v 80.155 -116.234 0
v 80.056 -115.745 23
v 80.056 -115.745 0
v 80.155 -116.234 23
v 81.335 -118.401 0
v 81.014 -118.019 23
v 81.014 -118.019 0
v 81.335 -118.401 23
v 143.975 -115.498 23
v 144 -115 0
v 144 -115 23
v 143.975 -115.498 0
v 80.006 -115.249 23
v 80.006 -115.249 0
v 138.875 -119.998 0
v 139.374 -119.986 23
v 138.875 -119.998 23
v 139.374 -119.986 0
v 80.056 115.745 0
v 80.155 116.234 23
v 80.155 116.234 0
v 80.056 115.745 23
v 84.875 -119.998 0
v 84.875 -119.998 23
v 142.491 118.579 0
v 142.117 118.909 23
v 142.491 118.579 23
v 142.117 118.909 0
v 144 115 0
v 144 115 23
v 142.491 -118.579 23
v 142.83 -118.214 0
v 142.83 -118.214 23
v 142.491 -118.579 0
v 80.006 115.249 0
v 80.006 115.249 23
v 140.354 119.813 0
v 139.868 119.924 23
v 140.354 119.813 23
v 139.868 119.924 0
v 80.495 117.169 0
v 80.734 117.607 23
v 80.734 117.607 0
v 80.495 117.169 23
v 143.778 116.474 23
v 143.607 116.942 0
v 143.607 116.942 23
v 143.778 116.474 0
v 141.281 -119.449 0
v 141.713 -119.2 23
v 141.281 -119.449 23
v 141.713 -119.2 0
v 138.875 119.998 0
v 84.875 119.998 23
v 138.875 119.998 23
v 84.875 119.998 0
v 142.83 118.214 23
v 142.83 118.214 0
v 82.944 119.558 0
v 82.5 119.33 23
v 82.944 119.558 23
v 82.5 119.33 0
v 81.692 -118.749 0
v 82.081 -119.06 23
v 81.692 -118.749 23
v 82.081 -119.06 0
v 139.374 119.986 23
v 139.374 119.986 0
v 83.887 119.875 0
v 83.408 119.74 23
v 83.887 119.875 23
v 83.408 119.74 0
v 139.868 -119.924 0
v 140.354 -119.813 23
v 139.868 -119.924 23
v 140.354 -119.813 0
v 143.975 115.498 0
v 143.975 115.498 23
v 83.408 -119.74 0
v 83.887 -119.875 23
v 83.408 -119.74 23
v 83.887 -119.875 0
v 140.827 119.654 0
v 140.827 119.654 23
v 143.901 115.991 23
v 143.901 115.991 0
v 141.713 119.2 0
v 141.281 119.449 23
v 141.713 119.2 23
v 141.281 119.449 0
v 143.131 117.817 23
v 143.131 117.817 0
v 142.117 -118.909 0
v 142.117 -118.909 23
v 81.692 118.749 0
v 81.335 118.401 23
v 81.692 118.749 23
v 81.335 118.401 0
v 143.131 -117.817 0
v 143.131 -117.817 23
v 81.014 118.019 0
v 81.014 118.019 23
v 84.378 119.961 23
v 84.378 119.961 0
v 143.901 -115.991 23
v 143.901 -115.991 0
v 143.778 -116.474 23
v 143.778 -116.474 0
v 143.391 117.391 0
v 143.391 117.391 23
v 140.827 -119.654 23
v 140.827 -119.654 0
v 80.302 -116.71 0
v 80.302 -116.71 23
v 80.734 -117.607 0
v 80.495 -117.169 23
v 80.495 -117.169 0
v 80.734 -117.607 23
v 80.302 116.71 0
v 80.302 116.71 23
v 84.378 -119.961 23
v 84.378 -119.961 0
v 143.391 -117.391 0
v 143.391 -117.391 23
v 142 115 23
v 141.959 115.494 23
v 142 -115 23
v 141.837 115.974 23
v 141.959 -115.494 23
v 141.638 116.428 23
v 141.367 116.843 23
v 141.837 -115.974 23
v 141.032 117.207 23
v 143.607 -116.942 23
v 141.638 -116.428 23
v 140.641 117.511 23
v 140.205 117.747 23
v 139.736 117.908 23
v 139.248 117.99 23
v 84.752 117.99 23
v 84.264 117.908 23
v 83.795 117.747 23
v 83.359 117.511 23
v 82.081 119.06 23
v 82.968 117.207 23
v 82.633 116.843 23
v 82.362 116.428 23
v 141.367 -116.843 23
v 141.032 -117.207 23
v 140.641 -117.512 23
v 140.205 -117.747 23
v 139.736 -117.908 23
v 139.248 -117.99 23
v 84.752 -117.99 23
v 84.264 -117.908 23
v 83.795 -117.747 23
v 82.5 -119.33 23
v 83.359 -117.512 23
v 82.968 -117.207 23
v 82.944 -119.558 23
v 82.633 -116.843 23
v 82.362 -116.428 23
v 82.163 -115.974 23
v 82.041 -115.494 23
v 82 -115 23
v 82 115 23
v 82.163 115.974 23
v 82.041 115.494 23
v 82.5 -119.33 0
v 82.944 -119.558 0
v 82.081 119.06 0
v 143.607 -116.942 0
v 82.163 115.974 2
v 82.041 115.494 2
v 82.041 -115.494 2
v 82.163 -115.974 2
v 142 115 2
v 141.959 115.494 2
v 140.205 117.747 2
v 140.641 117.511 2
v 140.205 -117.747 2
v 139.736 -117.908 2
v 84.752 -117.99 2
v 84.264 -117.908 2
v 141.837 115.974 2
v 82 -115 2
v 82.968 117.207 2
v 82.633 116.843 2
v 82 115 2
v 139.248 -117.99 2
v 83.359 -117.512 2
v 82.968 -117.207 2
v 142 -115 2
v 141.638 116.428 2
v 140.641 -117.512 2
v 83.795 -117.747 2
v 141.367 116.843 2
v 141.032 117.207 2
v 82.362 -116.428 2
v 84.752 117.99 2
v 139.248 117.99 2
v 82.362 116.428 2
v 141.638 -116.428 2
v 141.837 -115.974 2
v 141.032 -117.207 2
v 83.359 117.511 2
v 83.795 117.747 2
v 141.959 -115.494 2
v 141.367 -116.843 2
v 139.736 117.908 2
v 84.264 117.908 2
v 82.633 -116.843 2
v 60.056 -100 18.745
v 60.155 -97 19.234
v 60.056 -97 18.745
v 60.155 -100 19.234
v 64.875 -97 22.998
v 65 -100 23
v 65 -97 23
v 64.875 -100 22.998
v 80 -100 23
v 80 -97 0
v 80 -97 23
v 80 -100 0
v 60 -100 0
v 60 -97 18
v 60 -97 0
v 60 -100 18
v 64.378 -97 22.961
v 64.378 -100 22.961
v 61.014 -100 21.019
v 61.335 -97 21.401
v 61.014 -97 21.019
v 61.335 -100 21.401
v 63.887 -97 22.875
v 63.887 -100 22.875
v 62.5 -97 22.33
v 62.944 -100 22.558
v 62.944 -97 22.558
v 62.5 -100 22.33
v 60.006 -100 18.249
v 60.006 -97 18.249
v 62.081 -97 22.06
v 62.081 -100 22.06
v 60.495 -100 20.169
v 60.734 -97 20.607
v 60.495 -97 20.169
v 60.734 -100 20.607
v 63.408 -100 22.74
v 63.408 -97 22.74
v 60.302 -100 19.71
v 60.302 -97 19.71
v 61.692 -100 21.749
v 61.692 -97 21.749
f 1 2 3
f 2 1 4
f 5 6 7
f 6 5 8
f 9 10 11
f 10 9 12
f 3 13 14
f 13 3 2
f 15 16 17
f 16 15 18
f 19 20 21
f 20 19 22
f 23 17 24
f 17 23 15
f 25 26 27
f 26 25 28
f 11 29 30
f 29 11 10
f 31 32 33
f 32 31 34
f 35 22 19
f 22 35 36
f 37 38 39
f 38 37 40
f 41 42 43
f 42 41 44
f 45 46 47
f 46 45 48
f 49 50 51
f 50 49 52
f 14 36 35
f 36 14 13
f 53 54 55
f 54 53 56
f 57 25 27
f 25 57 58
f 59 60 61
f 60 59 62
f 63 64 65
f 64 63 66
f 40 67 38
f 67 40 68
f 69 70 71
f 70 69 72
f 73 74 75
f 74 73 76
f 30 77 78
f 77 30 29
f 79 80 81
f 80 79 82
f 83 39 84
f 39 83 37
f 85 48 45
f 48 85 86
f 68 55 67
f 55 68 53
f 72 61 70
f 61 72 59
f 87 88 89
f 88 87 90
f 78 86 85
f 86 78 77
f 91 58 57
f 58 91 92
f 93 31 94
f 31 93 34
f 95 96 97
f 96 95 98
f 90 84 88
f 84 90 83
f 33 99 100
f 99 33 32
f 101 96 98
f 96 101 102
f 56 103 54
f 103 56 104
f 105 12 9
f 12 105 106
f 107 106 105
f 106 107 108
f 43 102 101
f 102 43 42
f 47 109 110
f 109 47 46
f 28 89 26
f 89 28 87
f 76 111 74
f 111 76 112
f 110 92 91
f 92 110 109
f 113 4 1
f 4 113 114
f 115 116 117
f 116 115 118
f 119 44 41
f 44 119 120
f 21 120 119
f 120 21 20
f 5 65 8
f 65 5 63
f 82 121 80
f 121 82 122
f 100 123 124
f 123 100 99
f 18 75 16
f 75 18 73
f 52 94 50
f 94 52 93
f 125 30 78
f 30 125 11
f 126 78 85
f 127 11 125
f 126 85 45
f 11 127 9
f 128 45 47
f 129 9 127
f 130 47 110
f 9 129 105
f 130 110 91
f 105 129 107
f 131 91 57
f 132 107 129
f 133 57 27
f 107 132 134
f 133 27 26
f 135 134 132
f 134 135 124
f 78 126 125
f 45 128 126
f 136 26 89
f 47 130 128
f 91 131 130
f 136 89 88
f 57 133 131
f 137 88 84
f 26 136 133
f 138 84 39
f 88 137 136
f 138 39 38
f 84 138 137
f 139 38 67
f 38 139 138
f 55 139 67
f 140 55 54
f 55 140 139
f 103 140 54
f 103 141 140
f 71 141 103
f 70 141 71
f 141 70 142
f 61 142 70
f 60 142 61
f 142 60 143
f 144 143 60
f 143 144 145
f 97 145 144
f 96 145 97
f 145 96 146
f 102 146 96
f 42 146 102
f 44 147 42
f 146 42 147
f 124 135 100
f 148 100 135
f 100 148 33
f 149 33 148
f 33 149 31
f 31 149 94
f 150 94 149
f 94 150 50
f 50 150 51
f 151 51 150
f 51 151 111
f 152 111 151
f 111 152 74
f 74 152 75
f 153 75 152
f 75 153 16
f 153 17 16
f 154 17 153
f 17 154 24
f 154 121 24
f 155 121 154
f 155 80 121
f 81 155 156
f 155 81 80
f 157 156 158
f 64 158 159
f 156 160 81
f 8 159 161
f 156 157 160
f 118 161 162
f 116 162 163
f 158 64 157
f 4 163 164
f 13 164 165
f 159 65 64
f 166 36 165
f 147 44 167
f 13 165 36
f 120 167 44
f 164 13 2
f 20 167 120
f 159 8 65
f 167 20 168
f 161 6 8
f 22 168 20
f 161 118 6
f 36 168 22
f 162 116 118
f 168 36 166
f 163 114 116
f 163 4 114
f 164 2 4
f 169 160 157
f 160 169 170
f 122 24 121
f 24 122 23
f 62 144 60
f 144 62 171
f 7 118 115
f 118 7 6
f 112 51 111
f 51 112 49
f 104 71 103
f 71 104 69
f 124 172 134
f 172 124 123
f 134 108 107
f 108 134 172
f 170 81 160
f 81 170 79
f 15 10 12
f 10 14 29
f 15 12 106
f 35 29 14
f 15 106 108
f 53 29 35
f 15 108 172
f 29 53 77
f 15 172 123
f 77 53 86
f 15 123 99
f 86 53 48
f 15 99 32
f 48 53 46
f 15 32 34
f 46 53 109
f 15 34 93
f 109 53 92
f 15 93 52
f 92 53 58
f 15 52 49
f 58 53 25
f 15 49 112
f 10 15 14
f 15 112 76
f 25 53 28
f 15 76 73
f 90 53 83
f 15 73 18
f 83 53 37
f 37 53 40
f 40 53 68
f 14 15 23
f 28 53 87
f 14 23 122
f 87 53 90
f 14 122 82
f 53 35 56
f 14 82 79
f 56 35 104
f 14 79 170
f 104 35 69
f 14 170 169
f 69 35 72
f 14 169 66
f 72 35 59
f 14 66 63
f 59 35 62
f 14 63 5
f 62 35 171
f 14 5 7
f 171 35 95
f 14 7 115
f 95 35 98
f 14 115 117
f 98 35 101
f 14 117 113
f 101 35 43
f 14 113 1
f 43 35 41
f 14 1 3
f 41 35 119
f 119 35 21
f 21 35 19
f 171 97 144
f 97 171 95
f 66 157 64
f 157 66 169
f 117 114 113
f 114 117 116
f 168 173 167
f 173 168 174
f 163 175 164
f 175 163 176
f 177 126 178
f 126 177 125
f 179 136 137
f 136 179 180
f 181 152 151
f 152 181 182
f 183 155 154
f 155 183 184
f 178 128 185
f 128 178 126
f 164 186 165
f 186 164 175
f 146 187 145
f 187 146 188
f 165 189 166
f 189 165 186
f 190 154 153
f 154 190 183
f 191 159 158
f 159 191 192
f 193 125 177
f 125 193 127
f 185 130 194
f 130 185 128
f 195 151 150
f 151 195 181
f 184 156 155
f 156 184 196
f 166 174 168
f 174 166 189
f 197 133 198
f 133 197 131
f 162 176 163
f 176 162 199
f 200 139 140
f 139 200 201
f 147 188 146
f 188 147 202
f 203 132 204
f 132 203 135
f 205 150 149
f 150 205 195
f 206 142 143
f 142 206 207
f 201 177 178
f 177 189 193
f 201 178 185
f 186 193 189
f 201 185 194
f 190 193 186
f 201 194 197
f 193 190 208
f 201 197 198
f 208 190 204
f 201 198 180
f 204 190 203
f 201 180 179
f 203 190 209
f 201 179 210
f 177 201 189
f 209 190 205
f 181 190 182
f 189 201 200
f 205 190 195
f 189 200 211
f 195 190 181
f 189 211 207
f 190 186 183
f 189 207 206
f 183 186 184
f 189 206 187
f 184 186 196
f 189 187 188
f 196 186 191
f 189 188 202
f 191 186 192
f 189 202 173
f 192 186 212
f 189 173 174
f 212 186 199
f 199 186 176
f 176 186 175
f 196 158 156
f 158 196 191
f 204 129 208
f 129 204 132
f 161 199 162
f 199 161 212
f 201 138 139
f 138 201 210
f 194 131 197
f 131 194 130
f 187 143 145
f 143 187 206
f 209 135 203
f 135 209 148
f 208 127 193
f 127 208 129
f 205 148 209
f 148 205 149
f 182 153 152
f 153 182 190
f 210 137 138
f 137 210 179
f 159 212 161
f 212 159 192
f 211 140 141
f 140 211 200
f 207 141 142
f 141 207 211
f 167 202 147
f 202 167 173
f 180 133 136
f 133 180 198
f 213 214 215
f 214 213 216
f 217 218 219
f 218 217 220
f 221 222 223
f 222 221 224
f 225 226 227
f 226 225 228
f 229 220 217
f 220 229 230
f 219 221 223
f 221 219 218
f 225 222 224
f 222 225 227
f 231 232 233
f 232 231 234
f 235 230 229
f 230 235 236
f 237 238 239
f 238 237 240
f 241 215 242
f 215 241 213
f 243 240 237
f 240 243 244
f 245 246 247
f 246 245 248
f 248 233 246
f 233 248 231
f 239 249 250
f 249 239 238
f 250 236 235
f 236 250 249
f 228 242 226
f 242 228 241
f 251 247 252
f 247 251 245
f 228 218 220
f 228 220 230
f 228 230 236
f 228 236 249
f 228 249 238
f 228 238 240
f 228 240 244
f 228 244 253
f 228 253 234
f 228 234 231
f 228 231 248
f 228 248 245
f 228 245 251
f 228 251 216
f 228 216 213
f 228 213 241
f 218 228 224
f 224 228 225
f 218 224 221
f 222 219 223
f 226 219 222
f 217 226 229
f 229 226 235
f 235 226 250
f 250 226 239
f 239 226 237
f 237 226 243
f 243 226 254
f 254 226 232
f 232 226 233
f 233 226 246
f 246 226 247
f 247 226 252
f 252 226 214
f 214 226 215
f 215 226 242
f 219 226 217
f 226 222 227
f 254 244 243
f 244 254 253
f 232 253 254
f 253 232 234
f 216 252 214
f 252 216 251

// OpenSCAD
$fa = 5;
$fs = 0.5;

nozzle_to_toolhead_clearance_z = 1.5;

nozzle_max_start_height = 0;

servo = [23, 12.6, 30];
servo_mounts = [
    [-2.5, 6.3, 16],
    [25.5, 6.3, 16]
];
servo_pivot_point = [6.3, 6.3];

reach = 15;

plate_width = 10;

extrusion_to_bed = 60;

height_above_strip = nozzle_to_toolhead_clearance_z + nozzle_max_start_height - 0.5;

bed_height = 38;

strip = [reach + 7, 10, 1.5];
lip = [10, 10, height_above_strip, 1.5];

block = [extrusion_to_bed + 20, strip.y + 10, bed_height + height_above_strip];

servo_pos = [20 + extrusion_to_bed - 26 - servo.y/2 - 2, 2, bed_height - servo.z - strip.z - 1 - 2];

jst_connector = [10.4, 7.5, 6];

bucket_size = [64, 240, 23];
bucket_wall = 2;

base();

translate([20 + extrusion_to_bed - 27, 1, bed_height - strip.z - 1])
tray();

translate([servo_pos.x + servo.y/2, servo_pos.y + servo.y/2, servo_pos.z + servo.z])
pivot_arm();

!translate([extrusion_to_bed + 20, -bucket_size.y + 120, 0])
bucket();

// %translate(servo_pos)
// servo();


module bucket(){
    union() {
        difference() {
            roundedCube(bucket_size, 5);

            translate([bucket_wall, bucket_wall, bucket_wall])
            roundedCube([bucket_size.x - bucket_wall * 2, bucket_size.y - bucket_wall * 2, bucket_size.z], 5 - bucket_wall);

            // translate([-1, -1, bucket_size[3]])
            // cube([bucket_size.x + 2, bucket_size.y - 41, bucket_size.z]);
        }

        translate([-20, 20, 0])
        hull() {
            cube([20, 3, bucket_size.z - 5]);

            translate([5, 0, 0])
            cube([15, 3, bucket_size.z ]);

            translate([5, 0, bucket_size.z - 5])
            rotate([-90, 0, 0])
            cylinder(r = 5, h = 3);
            
        }
    }
}

module roundedCube(size, r){
    
    linear_extrude(height = size.z)
    hull() {
        for( p = [
            [r, r],
            [size.x - r, r],
            [size.x - r, size.y - r],
            [r, size.y - r]
        ]){
            translate(p)
            circle(r = r);
        }
    }
}

module servo_head() {
    union() {
        for(a = [0 : 360/21 : 359])
        rotate([0, 0, a])
        translate([2.2, 0, 0])
        cylinder(r = 0.35, h = 3, $fs = 0.2);

        cylinder(d = 4.3, h = 3);
    }
}

module pivot_arm() {
    difference() {
        union() {
            translate([0, 0, -3])
            difference() {
                translate([0, 0, 0.4])
                cylinder(d = 7, h = 4.4);

                servo_head();
            }
            hull() {
                cylinder(d = 7, h = 1.8);

                translate([reach/2, 0, 0])
                cylinder(d = 6, h = 1.8);
            }
        }

        cylinder(d = 2.5, h = 3);
        
        translate([0, 0, 0.8])
        cylinder(d = 5, h = 3);
        
        translate([0, 0, 0.8])
        intersection() {
            cube([5, 2.5, 0.4], center = true);
            translate([0, 0, -0.2])
            cylinder(d = 5, h = 0.4);
        }

        translate([reach/2, 0, 0])
        cylinder(d = 1.5, h = 3);
    }
}

module tray(){
    render()
    difference() {
        union() {
            cube([21, strip.y + 8, strip.z + 1]);

            translate([0, 3, 0])
            cube([strip.x + 21, strip.y + 2, strip.z + 1]);
        }

        translate([26, 4, 1])
        cube(strip);

        translate([reach/2, servo.y/2 + 1, -1])
        hull() {
            cylinder(d = 4, h = 5);
            translate([0, 7.5, 0])
            cylinder(d = 4, h = 5);
        }
    }
}

module base() {
    union() {
        // extrusion mount
        

        difference() {
            union() {
                cube([block.x, block.y, 6]);

                translate([block.x - servo.x - 20, 0, 0])
                cube([servo.x + 20, block.y, block.z]);

                difference() {
                    hull() {
                        translate([0, -20, 0])
                        cube([20, block.y + 40, 6]);

                        cube([33, block.y, 6]);
                    }

                    for(y = [-10, block.y + 10])
                    translate([10, y, -1]){
                        cylinder(d = 3.5, h = 8);
                        translate([0, 0, 3])
                        cylinder(d = 7, h = 6);
                    }
                }

                hull(){
                    translate([20, 0, 0])
                    cube([40, block.y, 6]);

                    translate([40, 0, 0])
                    cube([1, block.y, 20]);
                }
            }

            // servo cavity
            translate(servo_pos)
            servo();

            // servo insertion room
            translate([servo_pos.x - 5, 2, bed_height - 16])
            cube([servo.x + 10, servo.y, 50]);

            // servo cables
            translate([servo_pos.x - 1.5, servo_pos.y + servo.y/2 - 2, -1])
            cube([1.51, 4, 100]);

            translate([servo_pos.x - jst_connector.x, servo.y/2 + servo_pos.y - 2, -0.01])
            cube([jst_connector.x, 4, 2]);

            // servo plug hole
            // translate([servo_pos.x, servo_pos.y + servo.y/2 - 4.5, -1])
            // cube([5, 9, 10]);

            // jst connector
            translate([servo_pos.x - jst_connector.x - 1, block.y - jst_connector.y - 0.4, -0.01])
            cube(jst_connector);
            
            translate([servo_pos.x - jst_connector.x - 0.5, servo.y/2 + servo_pos.y - 2, -0.01])
            cube([jst_connector.x - 1, block.y, jst_connector.z]);

            // servo mounting screws
            translate(servo_pos)
            for(p = servo_mounts)
            translate([p.x, p.y, p.z - 10])
            cylinder(d = 1, h = 11);


            // pivot room
            translate([servo_pos.x + servo.y/2, 2 + servo.y/2, bed_height - strip.z - 1 - 2 - 3])
            difference() {
                cylinder(r = 11, h = 5);

                translate([-15, -15, 0])
                cube([30, 15, 30]);
            }

            // tray room
            translate([0, 1 - 0.2, bed_height - strip.z - 1 - 0.2])
            hull() {
                cube([20 + extrusion_to_bed - 5, strip.y + 8.4, strip.z + 1.4]);
                
                translate([0, 1, 1])
                cube([20 + extrusion_to_bed - 5, strip.y + 6.4, strip.z + 1.4]);
            }
            
            translate([0, 1.8, bed_height - strip.z - 1 - 0.2])
            cube([20 + extrusion_to_bed - 5, strip.y + 6.4, 20]);

            // tray narrow part
            translate([0, 3.8, bed_height - strip.z - 1 - 0.2])
            cube([20 + extrusion_to_bed + 5, strip.y + 2.4, strip.z + 1.4]);


            // //lip cavity
            // translate([block.x, block.y/2, block.z - height_above_strip/2 + 0.4])
            // rotate([0, 0, 45])
            // cube([5 * sqrt(2), 5 * sqrt(2), height_above_strip], center = true);
        }
    }
}

module servo(){
    union(){
        cube([servo.x, servo.y, 22.6]);

        translate([-5, 0, servo_mounts[0].z])
        cube([servo.x + 10, servo.y, 2.6]);

        translate([servo.y/2, servo.y/2, 22.6])
        cylinder(d = servo.y, h = 4.5);

        translate([servo.y/2, servo.y/2, servo.z - 4])
        cylinder(d = 5, h = 4);
    }
}
